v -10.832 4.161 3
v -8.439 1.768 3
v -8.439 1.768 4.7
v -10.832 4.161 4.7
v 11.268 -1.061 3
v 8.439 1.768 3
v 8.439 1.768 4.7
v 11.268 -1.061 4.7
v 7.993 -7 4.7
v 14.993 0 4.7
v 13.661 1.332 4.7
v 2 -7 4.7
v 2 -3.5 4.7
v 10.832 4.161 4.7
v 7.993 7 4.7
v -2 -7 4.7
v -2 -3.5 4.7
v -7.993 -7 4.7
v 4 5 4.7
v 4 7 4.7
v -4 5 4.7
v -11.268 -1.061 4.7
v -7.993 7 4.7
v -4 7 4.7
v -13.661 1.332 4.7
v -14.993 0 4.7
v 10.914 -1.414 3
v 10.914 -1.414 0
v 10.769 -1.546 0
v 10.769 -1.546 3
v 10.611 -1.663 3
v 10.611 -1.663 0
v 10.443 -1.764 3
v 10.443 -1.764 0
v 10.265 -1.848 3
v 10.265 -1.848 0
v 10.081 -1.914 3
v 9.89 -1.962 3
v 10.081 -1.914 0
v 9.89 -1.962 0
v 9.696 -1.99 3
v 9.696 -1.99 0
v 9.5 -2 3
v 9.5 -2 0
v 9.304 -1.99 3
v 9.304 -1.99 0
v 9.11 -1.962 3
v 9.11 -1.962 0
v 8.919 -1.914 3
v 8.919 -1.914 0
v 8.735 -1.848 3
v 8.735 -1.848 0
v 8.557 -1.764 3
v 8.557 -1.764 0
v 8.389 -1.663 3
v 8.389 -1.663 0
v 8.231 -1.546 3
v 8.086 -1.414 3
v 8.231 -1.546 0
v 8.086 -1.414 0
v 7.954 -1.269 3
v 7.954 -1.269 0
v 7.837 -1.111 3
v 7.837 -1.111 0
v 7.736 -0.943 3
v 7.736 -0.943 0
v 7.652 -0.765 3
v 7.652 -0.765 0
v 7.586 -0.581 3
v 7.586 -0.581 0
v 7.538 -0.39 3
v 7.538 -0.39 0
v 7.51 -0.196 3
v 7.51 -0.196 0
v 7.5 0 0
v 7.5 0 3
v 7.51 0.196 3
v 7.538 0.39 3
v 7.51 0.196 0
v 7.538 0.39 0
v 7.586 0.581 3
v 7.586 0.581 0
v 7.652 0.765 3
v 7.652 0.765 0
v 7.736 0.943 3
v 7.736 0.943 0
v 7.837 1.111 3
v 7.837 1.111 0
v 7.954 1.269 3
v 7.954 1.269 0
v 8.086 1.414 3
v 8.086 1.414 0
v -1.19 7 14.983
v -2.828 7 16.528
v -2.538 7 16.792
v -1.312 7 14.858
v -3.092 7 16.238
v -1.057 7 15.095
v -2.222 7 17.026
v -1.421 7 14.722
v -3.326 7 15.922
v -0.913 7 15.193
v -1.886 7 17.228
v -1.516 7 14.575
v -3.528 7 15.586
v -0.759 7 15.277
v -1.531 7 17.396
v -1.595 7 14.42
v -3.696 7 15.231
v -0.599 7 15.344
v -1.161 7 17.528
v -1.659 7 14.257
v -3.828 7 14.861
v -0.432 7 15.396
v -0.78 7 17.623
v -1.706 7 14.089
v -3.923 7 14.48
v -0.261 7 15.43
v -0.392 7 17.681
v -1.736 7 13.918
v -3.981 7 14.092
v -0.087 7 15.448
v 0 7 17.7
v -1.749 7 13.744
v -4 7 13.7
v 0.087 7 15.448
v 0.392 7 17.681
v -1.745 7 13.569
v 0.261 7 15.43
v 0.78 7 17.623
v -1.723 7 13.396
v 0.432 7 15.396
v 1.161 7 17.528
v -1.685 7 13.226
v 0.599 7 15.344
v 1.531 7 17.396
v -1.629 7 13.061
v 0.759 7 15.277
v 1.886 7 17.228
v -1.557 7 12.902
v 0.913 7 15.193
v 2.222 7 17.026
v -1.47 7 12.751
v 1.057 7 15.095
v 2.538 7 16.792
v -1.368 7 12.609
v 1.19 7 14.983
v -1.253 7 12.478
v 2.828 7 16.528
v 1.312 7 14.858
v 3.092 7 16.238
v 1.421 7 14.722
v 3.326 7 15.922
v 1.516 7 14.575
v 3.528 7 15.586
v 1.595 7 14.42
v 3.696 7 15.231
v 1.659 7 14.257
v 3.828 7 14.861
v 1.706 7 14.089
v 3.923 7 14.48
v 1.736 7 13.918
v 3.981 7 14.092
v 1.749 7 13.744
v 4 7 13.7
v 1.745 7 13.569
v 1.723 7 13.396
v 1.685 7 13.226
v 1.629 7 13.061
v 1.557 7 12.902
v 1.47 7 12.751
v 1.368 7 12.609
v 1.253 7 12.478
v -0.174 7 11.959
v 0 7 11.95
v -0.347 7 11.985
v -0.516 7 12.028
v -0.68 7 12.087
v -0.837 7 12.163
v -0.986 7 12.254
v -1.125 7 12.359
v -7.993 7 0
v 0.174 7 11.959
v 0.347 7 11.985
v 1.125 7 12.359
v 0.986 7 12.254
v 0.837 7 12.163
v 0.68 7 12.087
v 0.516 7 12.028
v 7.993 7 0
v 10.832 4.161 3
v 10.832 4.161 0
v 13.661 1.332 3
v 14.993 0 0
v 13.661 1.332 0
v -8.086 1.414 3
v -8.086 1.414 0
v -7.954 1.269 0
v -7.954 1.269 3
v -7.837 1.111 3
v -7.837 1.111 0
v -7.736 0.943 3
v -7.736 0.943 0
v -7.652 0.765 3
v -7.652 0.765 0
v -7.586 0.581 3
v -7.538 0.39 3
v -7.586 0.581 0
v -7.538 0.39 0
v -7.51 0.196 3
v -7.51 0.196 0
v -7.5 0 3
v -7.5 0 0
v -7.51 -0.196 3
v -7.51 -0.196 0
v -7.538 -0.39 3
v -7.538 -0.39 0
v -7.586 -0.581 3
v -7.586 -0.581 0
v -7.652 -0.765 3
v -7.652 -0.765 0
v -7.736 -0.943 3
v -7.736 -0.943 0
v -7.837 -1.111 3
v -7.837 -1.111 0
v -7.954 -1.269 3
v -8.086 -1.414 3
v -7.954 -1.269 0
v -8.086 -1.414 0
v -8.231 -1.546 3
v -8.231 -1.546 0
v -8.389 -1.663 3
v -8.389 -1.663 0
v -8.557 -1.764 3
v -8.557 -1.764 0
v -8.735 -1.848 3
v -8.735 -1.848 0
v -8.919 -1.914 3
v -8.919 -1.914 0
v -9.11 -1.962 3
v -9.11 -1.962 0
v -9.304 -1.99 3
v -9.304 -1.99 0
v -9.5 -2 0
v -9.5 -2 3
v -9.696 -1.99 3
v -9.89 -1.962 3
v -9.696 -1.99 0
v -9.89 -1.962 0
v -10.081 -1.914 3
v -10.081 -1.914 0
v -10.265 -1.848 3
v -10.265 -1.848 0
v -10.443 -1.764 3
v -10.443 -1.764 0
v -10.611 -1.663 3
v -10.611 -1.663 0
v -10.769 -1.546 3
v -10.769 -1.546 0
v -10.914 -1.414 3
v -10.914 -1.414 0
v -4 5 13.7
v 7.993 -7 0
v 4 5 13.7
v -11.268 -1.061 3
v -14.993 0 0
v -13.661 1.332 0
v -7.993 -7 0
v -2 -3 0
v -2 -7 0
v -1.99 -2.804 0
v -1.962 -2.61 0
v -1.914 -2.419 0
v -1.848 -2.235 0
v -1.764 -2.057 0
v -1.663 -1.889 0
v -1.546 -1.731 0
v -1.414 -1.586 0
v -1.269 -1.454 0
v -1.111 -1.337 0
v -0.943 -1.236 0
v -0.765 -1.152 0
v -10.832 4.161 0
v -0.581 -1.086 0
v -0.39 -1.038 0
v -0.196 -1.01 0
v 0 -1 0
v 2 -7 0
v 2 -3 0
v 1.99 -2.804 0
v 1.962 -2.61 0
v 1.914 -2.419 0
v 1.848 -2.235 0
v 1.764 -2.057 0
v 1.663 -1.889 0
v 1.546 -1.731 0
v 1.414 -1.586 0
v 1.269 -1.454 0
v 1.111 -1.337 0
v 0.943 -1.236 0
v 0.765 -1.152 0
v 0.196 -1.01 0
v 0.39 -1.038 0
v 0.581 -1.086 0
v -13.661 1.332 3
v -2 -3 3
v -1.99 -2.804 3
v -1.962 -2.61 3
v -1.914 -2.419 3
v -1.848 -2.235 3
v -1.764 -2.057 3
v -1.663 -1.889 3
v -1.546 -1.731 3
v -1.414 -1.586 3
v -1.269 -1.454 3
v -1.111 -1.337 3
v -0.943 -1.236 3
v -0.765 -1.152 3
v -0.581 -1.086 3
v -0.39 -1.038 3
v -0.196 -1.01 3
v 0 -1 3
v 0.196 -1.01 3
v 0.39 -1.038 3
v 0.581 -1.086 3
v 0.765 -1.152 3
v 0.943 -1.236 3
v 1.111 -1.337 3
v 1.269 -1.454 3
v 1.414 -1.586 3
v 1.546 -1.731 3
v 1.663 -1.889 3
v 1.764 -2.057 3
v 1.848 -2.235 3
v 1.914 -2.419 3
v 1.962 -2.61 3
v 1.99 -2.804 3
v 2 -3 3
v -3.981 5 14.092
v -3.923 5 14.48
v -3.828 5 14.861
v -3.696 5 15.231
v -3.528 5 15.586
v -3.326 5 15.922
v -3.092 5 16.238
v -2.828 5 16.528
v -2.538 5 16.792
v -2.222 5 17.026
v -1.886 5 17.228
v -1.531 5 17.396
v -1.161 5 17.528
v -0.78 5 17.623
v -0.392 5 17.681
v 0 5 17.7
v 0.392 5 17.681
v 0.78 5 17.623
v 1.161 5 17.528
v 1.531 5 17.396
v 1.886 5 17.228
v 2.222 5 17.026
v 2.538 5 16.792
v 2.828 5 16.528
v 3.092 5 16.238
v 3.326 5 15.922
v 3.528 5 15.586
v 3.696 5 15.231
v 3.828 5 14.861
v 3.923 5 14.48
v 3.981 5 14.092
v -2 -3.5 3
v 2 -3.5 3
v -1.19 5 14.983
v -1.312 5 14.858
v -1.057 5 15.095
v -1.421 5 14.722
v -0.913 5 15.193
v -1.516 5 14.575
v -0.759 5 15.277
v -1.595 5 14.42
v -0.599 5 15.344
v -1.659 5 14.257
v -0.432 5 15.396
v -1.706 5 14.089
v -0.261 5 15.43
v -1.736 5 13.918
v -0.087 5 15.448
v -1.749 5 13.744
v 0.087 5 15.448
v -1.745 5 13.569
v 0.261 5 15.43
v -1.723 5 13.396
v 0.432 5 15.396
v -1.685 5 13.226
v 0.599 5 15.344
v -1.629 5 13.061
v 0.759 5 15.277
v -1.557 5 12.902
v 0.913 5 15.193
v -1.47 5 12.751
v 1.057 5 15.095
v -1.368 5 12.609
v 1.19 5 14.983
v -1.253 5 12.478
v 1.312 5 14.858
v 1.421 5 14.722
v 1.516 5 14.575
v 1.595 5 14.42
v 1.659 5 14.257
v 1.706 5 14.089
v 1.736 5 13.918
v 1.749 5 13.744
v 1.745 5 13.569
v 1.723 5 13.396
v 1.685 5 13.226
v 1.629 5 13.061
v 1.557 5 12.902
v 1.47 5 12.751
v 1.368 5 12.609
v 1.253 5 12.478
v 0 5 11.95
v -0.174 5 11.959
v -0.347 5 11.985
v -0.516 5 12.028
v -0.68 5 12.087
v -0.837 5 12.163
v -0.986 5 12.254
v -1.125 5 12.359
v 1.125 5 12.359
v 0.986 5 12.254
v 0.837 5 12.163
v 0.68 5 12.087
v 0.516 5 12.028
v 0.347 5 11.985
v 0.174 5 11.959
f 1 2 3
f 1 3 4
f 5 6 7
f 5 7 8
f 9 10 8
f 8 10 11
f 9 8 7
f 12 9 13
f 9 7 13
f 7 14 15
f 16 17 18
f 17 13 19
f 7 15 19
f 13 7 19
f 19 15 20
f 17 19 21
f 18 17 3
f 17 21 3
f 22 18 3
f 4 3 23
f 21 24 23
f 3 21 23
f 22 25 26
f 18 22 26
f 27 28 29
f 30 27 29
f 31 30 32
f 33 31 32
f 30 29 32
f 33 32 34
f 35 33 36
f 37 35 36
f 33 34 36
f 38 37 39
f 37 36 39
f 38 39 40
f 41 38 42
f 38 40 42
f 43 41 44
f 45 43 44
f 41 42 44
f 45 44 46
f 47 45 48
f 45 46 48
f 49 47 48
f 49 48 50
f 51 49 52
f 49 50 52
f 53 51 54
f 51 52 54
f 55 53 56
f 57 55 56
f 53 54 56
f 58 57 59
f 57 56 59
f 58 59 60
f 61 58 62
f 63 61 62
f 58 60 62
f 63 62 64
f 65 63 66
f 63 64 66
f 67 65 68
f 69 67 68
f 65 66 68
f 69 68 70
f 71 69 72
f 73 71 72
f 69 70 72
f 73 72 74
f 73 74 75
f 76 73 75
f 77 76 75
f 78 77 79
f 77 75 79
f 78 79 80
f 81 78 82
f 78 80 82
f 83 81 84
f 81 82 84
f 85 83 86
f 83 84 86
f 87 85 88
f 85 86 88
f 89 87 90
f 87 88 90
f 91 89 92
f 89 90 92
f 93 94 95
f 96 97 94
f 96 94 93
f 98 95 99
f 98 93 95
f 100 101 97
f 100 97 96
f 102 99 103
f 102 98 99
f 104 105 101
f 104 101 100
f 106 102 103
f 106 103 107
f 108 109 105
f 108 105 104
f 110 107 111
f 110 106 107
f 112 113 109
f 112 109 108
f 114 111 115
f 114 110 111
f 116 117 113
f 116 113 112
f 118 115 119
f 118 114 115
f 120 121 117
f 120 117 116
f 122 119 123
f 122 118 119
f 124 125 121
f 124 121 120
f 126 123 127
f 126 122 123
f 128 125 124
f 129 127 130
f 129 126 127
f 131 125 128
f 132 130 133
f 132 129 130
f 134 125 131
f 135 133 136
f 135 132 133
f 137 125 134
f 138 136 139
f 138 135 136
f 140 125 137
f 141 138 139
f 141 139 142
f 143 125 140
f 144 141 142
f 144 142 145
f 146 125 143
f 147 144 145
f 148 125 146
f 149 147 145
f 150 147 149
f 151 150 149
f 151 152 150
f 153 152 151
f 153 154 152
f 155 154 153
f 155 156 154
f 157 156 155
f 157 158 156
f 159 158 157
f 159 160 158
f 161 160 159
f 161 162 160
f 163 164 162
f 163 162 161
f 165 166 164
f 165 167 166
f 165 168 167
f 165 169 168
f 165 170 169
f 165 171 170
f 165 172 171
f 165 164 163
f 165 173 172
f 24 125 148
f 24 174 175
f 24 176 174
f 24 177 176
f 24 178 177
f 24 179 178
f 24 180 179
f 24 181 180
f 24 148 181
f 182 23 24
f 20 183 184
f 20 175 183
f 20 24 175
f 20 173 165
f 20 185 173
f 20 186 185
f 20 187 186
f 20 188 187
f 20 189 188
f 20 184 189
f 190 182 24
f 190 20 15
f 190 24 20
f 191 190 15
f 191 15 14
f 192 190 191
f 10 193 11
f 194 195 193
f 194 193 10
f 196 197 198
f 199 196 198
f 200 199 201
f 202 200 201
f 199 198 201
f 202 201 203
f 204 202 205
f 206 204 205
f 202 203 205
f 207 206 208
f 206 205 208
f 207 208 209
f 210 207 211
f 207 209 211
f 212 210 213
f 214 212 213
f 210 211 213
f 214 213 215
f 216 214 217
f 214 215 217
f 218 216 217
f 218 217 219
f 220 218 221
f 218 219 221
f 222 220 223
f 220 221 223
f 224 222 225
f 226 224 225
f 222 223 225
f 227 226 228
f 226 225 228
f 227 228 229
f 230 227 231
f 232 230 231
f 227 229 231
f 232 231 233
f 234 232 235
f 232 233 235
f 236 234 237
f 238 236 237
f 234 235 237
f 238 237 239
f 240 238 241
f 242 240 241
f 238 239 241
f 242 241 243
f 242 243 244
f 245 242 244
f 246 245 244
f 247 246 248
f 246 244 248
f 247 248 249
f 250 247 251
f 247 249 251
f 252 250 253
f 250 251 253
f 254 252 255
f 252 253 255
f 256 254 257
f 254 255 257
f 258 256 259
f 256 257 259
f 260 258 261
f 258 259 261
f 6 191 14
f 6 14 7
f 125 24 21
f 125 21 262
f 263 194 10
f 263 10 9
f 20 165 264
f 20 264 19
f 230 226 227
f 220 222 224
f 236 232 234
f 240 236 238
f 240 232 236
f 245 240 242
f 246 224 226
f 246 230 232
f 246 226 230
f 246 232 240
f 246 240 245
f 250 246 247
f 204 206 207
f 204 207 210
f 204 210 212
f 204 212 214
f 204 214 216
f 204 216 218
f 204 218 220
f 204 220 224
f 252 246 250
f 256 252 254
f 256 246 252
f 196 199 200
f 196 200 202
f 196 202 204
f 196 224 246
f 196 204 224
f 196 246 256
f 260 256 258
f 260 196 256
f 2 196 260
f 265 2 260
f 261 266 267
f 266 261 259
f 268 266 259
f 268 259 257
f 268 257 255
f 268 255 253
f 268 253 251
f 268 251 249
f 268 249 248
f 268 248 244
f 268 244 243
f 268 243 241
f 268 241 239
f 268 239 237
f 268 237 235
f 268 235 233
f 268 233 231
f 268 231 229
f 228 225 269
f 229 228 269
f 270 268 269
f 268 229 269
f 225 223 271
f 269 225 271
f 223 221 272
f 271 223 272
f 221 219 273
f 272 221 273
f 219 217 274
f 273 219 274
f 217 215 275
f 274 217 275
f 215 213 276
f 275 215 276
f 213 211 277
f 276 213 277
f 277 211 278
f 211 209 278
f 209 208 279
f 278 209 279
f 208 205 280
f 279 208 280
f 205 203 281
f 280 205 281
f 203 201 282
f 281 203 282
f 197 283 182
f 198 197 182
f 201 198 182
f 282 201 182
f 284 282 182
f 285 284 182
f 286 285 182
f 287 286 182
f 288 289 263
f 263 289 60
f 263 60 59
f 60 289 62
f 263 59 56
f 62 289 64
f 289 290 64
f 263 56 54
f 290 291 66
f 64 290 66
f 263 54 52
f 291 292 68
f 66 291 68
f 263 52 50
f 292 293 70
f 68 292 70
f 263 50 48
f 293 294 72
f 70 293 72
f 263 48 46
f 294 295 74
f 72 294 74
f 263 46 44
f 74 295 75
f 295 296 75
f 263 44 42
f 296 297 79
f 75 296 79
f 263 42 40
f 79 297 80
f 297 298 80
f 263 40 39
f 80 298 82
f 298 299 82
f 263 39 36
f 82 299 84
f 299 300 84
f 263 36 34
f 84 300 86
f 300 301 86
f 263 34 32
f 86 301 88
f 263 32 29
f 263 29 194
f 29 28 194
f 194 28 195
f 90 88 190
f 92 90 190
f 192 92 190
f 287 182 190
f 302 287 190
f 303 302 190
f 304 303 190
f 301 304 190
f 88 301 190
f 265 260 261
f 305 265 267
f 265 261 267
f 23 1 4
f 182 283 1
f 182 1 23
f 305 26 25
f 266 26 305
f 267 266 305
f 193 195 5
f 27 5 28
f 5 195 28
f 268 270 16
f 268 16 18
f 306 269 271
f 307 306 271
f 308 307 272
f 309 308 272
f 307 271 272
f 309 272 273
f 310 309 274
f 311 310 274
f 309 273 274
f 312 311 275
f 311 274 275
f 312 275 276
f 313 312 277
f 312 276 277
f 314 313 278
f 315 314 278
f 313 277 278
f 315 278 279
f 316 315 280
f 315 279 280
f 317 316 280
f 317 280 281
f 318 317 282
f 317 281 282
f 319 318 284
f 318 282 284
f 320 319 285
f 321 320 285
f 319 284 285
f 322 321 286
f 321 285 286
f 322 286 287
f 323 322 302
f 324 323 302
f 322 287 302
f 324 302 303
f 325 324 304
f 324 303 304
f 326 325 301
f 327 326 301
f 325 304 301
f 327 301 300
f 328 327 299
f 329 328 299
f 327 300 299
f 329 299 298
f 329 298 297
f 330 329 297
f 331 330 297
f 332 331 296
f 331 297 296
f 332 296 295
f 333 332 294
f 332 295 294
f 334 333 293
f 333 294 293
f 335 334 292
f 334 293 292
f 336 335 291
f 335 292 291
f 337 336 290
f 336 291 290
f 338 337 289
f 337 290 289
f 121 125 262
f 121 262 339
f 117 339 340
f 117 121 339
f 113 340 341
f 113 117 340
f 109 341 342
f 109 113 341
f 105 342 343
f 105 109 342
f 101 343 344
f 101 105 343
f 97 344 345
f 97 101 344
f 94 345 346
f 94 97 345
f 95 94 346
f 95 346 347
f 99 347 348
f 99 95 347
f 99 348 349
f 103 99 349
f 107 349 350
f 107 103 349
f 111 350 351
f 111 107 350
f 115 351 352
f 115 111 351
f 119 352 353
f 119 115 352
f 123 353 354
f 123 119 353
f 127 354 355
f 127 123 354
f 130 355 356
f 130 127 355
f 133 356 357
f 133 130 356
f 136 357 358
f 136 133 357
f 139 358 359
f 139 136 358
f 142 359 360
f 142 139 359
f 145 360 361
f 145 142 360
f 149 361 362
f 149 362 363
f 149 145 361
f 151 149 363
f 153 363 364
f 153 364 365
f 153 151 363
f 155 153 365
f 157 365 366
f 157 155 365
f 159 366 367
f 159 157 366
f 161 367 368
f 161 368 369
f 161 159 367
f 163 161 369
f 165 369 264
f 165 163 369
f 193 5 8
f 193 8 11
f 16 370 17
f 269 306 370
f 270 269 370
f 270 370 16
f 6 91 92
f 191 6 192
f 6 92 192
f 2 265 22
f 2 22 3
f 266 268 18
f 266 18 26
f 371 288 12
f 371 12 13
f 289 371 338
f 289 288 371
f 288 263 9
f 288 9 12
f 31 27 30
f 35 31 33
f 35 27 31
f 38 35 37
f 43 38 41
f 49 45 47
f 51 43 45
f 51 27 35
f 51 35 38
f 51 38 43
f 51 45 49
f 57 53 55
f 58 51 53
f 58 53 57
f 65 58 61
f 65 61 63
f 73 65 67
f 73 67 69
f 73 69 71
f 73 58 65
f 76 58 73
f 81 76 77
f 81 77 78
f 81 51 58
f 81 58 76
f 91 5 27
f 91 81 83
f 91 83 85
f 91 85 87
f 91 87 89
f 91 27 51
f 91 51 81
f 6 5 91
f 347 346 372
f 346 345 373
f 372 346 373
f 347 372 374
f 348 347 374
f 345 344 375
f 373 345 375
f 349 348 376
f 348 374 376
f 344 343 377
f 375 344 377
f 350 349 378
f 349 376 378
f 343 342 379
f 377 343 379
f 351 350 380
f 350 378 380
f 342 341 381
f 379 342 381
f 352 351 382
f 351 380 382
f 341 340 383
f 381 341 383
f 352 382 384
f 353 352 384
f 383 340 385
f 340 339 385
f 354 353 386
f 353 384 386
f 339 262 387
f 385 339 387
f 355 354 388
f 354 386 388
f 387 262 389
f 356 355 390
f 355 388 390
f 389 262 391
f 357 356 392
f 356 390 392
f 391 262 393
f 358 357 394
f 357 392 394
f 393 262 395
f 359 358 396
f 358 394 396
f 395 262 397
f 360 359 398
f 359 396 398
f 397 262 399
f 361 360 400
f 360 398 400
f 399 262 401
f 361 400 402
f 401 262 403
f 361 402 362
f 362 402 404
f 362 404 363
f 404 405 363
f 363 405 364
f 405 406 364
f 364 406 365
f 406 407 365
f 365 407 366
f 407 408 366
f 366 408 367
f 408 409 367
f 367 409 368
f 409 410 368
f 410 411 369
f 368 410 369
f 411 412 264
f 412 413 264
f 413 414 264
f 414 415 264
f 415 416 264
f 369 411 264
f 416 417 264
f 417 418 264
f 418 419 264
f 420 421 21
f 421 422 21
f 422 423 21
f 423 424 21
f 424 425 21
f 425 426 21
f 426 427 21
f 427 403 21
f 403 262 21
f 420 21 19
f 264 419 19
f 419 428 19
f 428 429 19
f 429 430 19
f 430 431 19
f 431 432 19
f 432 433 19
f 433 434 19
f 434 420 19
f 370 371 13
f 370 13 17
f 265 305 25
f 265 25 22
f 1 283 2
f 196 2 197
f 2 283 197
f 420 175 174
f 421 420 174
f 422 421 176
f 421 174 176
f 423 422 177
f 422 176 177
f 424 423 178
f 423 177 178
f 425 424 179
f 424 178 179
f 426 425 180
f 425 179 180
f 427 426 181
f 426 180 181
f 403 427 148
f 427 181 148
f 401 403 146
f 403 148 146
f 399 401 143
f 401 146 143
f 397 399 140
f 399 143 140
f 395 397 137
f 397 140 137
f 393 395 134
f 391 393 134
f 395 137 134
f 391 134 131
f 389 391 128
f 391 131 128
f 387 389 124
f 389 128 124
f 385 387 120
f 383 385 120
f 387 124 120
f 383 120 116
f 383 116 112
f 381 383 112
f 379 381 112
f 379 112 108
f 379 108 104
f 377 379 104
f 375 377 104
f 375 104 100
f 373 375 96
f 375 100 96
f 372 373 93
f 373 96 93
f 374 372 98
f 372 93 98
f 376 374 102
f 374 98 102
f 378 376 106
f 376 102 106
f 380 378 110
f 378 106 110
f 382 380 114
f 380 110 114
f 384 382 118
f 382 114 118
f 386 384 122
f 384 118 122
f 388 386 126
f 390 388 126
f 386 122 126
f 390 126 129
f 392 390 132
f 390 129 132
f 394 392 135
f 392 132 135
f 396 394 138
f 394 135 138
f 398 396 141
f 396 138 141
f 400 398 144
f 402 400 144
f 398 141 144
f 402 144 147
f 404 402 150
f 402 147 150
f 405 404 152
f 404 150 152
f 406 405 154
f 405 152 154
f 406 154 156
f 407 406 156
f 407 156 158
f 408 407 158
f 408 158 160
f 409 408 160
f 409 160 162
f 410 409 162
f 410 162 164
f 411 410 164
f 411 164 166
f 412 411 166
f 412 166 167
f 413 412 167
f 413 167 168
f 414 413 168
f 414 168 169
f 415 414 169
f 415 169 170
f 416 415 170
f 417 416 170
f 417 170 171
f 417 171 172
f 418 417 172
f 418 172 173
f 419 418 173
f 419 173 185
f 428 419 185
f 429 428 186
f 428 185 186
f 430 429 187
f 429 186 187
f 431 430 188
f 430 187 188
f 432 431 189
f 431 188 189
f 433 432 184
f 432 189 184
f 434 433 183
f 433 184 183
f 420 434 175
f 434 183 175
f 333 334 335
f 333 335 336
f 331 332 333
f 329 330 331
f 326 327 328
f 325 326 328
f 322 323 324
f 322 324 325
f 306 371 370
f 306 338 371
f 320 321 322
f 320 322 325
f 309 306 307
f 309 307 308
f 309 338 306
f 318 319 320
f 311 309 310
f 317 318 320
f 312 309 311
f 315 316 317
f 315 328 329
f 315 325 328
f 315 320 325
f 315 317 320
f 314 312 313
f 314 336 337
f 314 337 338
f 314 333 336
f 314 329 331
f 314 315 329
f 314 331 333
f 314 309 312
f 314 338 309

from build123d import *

# Parameters (mm, degrees)
RESSALTO_EXTRUS_O1_DEPTH = 3
RESSALTO_EXTRUS_O2_DEPTH = 1.7
ESBO_O3_R                = 1.75
RESSALTO_EXTRUS_O3_DEPTH = 2


with BuildPart() as part:
    # Esboço1 → Ressalto-extrusão1 (new body)
    with BuildSketch(Plane.XY):
        with BuildLine():
            Line((-7.992880918, 7), (-10.832226897, 4.160654021))
            Line((-10.832226897, 4.160654021), (-8.085786438, 1.414213562))
            ThreePointArc((-8.085786438, 1.414213562), (-8.085786438, -1.414213562), (-10.914213562, -1.414213562))
            Line((-10.914213562, -1.414213562), (-13.660654021, 1.332226897))
            Line((-13.660654021, 1.332226897), (-14.992880918, 0))
            Line((-14.992880918, 0), (-7.992880918, -7))
            Line((-7.992880918, -7), (-2, -7))
            Line((-2, -7), (-2, -3))
            ThreePointArc((-2, -3), (0, -1), (2, -3))
            Line((2, -3), (2, -7))
            Line((2, -7), (7.992880918, -7))
            Line((7.992880918, -7), (14.992880918, 0))
            Line((14.992880918, 0), (13.660654021, 1.332226897))
            Line((13.660654021, 1.332226897), (10.914213562, -1.414213562))
            ThreePointArc((10.914213562, -1.414213562), (8.085786438, -1.414213562), (8.085786438, 1.414213562))
            Line((8.085786438, 1.414213562), (10.832226897, 4.160654021))
            Line((10.832226897, 4.160654021), (7.992880918, 7))
            Line((7.992880918, 7), (-7.992880918, 7))
        make_face()
    extrude(amount=RESSALTO_EXTRUS_O1_DEPTH)

    # Esboço2 → Ressalto-extrusão2 (add)
    with BuildSketch(Plane.XY.offset(3)):
        Polygon((-11.267766953, -1.060660172), (-8.439339828, 1.767766953), (-10.832226897, 4.160654021), (-7.992880918, 7), (7.992880918, 7), (10.832226897, 4.160654021), (8.439339828, 1.767766953), (11.267766953, -1.060660172), (13.660654021, 1.332226897), (14.992880918, 0), (7.992880918, -7), (2, -7), (2, -3.5), (-2, -3.5), (-2, -7), (-7.992880918, -7), (-14.992880918, 0), (-13.660654021, 1.332226897), align=None)
    extrude(amount=RESSALTO_EXTRUS_O2_DEPTH)

    # Esboço3 → Ressalto-extrusão3 (add)
    with BuildSketch(Plane(origin=(0, 7, 0), x_dir=(1, 0, 0), z_dir=(0, 1, 0))):
        with BuildLine():
            Line((4, -13.7), (4, -4.7))
            Line((4, -4.7), (-4, -4.7))
            Line((-4, -4.7), (-4, -13.7))
            ThreePointArc((-4, -13.7), (0, -17.7), (4, -13.7))
        make_face()
        with Locations(Location((0, -13.7, 0), (0, 0, 90))):
            Circle(ESBO_O3_R, mode=Mode.SUBTRACT)
    extrude(amount=-RESSALTO_EXTRUS_O3_DEPTH)


solid = part.part
